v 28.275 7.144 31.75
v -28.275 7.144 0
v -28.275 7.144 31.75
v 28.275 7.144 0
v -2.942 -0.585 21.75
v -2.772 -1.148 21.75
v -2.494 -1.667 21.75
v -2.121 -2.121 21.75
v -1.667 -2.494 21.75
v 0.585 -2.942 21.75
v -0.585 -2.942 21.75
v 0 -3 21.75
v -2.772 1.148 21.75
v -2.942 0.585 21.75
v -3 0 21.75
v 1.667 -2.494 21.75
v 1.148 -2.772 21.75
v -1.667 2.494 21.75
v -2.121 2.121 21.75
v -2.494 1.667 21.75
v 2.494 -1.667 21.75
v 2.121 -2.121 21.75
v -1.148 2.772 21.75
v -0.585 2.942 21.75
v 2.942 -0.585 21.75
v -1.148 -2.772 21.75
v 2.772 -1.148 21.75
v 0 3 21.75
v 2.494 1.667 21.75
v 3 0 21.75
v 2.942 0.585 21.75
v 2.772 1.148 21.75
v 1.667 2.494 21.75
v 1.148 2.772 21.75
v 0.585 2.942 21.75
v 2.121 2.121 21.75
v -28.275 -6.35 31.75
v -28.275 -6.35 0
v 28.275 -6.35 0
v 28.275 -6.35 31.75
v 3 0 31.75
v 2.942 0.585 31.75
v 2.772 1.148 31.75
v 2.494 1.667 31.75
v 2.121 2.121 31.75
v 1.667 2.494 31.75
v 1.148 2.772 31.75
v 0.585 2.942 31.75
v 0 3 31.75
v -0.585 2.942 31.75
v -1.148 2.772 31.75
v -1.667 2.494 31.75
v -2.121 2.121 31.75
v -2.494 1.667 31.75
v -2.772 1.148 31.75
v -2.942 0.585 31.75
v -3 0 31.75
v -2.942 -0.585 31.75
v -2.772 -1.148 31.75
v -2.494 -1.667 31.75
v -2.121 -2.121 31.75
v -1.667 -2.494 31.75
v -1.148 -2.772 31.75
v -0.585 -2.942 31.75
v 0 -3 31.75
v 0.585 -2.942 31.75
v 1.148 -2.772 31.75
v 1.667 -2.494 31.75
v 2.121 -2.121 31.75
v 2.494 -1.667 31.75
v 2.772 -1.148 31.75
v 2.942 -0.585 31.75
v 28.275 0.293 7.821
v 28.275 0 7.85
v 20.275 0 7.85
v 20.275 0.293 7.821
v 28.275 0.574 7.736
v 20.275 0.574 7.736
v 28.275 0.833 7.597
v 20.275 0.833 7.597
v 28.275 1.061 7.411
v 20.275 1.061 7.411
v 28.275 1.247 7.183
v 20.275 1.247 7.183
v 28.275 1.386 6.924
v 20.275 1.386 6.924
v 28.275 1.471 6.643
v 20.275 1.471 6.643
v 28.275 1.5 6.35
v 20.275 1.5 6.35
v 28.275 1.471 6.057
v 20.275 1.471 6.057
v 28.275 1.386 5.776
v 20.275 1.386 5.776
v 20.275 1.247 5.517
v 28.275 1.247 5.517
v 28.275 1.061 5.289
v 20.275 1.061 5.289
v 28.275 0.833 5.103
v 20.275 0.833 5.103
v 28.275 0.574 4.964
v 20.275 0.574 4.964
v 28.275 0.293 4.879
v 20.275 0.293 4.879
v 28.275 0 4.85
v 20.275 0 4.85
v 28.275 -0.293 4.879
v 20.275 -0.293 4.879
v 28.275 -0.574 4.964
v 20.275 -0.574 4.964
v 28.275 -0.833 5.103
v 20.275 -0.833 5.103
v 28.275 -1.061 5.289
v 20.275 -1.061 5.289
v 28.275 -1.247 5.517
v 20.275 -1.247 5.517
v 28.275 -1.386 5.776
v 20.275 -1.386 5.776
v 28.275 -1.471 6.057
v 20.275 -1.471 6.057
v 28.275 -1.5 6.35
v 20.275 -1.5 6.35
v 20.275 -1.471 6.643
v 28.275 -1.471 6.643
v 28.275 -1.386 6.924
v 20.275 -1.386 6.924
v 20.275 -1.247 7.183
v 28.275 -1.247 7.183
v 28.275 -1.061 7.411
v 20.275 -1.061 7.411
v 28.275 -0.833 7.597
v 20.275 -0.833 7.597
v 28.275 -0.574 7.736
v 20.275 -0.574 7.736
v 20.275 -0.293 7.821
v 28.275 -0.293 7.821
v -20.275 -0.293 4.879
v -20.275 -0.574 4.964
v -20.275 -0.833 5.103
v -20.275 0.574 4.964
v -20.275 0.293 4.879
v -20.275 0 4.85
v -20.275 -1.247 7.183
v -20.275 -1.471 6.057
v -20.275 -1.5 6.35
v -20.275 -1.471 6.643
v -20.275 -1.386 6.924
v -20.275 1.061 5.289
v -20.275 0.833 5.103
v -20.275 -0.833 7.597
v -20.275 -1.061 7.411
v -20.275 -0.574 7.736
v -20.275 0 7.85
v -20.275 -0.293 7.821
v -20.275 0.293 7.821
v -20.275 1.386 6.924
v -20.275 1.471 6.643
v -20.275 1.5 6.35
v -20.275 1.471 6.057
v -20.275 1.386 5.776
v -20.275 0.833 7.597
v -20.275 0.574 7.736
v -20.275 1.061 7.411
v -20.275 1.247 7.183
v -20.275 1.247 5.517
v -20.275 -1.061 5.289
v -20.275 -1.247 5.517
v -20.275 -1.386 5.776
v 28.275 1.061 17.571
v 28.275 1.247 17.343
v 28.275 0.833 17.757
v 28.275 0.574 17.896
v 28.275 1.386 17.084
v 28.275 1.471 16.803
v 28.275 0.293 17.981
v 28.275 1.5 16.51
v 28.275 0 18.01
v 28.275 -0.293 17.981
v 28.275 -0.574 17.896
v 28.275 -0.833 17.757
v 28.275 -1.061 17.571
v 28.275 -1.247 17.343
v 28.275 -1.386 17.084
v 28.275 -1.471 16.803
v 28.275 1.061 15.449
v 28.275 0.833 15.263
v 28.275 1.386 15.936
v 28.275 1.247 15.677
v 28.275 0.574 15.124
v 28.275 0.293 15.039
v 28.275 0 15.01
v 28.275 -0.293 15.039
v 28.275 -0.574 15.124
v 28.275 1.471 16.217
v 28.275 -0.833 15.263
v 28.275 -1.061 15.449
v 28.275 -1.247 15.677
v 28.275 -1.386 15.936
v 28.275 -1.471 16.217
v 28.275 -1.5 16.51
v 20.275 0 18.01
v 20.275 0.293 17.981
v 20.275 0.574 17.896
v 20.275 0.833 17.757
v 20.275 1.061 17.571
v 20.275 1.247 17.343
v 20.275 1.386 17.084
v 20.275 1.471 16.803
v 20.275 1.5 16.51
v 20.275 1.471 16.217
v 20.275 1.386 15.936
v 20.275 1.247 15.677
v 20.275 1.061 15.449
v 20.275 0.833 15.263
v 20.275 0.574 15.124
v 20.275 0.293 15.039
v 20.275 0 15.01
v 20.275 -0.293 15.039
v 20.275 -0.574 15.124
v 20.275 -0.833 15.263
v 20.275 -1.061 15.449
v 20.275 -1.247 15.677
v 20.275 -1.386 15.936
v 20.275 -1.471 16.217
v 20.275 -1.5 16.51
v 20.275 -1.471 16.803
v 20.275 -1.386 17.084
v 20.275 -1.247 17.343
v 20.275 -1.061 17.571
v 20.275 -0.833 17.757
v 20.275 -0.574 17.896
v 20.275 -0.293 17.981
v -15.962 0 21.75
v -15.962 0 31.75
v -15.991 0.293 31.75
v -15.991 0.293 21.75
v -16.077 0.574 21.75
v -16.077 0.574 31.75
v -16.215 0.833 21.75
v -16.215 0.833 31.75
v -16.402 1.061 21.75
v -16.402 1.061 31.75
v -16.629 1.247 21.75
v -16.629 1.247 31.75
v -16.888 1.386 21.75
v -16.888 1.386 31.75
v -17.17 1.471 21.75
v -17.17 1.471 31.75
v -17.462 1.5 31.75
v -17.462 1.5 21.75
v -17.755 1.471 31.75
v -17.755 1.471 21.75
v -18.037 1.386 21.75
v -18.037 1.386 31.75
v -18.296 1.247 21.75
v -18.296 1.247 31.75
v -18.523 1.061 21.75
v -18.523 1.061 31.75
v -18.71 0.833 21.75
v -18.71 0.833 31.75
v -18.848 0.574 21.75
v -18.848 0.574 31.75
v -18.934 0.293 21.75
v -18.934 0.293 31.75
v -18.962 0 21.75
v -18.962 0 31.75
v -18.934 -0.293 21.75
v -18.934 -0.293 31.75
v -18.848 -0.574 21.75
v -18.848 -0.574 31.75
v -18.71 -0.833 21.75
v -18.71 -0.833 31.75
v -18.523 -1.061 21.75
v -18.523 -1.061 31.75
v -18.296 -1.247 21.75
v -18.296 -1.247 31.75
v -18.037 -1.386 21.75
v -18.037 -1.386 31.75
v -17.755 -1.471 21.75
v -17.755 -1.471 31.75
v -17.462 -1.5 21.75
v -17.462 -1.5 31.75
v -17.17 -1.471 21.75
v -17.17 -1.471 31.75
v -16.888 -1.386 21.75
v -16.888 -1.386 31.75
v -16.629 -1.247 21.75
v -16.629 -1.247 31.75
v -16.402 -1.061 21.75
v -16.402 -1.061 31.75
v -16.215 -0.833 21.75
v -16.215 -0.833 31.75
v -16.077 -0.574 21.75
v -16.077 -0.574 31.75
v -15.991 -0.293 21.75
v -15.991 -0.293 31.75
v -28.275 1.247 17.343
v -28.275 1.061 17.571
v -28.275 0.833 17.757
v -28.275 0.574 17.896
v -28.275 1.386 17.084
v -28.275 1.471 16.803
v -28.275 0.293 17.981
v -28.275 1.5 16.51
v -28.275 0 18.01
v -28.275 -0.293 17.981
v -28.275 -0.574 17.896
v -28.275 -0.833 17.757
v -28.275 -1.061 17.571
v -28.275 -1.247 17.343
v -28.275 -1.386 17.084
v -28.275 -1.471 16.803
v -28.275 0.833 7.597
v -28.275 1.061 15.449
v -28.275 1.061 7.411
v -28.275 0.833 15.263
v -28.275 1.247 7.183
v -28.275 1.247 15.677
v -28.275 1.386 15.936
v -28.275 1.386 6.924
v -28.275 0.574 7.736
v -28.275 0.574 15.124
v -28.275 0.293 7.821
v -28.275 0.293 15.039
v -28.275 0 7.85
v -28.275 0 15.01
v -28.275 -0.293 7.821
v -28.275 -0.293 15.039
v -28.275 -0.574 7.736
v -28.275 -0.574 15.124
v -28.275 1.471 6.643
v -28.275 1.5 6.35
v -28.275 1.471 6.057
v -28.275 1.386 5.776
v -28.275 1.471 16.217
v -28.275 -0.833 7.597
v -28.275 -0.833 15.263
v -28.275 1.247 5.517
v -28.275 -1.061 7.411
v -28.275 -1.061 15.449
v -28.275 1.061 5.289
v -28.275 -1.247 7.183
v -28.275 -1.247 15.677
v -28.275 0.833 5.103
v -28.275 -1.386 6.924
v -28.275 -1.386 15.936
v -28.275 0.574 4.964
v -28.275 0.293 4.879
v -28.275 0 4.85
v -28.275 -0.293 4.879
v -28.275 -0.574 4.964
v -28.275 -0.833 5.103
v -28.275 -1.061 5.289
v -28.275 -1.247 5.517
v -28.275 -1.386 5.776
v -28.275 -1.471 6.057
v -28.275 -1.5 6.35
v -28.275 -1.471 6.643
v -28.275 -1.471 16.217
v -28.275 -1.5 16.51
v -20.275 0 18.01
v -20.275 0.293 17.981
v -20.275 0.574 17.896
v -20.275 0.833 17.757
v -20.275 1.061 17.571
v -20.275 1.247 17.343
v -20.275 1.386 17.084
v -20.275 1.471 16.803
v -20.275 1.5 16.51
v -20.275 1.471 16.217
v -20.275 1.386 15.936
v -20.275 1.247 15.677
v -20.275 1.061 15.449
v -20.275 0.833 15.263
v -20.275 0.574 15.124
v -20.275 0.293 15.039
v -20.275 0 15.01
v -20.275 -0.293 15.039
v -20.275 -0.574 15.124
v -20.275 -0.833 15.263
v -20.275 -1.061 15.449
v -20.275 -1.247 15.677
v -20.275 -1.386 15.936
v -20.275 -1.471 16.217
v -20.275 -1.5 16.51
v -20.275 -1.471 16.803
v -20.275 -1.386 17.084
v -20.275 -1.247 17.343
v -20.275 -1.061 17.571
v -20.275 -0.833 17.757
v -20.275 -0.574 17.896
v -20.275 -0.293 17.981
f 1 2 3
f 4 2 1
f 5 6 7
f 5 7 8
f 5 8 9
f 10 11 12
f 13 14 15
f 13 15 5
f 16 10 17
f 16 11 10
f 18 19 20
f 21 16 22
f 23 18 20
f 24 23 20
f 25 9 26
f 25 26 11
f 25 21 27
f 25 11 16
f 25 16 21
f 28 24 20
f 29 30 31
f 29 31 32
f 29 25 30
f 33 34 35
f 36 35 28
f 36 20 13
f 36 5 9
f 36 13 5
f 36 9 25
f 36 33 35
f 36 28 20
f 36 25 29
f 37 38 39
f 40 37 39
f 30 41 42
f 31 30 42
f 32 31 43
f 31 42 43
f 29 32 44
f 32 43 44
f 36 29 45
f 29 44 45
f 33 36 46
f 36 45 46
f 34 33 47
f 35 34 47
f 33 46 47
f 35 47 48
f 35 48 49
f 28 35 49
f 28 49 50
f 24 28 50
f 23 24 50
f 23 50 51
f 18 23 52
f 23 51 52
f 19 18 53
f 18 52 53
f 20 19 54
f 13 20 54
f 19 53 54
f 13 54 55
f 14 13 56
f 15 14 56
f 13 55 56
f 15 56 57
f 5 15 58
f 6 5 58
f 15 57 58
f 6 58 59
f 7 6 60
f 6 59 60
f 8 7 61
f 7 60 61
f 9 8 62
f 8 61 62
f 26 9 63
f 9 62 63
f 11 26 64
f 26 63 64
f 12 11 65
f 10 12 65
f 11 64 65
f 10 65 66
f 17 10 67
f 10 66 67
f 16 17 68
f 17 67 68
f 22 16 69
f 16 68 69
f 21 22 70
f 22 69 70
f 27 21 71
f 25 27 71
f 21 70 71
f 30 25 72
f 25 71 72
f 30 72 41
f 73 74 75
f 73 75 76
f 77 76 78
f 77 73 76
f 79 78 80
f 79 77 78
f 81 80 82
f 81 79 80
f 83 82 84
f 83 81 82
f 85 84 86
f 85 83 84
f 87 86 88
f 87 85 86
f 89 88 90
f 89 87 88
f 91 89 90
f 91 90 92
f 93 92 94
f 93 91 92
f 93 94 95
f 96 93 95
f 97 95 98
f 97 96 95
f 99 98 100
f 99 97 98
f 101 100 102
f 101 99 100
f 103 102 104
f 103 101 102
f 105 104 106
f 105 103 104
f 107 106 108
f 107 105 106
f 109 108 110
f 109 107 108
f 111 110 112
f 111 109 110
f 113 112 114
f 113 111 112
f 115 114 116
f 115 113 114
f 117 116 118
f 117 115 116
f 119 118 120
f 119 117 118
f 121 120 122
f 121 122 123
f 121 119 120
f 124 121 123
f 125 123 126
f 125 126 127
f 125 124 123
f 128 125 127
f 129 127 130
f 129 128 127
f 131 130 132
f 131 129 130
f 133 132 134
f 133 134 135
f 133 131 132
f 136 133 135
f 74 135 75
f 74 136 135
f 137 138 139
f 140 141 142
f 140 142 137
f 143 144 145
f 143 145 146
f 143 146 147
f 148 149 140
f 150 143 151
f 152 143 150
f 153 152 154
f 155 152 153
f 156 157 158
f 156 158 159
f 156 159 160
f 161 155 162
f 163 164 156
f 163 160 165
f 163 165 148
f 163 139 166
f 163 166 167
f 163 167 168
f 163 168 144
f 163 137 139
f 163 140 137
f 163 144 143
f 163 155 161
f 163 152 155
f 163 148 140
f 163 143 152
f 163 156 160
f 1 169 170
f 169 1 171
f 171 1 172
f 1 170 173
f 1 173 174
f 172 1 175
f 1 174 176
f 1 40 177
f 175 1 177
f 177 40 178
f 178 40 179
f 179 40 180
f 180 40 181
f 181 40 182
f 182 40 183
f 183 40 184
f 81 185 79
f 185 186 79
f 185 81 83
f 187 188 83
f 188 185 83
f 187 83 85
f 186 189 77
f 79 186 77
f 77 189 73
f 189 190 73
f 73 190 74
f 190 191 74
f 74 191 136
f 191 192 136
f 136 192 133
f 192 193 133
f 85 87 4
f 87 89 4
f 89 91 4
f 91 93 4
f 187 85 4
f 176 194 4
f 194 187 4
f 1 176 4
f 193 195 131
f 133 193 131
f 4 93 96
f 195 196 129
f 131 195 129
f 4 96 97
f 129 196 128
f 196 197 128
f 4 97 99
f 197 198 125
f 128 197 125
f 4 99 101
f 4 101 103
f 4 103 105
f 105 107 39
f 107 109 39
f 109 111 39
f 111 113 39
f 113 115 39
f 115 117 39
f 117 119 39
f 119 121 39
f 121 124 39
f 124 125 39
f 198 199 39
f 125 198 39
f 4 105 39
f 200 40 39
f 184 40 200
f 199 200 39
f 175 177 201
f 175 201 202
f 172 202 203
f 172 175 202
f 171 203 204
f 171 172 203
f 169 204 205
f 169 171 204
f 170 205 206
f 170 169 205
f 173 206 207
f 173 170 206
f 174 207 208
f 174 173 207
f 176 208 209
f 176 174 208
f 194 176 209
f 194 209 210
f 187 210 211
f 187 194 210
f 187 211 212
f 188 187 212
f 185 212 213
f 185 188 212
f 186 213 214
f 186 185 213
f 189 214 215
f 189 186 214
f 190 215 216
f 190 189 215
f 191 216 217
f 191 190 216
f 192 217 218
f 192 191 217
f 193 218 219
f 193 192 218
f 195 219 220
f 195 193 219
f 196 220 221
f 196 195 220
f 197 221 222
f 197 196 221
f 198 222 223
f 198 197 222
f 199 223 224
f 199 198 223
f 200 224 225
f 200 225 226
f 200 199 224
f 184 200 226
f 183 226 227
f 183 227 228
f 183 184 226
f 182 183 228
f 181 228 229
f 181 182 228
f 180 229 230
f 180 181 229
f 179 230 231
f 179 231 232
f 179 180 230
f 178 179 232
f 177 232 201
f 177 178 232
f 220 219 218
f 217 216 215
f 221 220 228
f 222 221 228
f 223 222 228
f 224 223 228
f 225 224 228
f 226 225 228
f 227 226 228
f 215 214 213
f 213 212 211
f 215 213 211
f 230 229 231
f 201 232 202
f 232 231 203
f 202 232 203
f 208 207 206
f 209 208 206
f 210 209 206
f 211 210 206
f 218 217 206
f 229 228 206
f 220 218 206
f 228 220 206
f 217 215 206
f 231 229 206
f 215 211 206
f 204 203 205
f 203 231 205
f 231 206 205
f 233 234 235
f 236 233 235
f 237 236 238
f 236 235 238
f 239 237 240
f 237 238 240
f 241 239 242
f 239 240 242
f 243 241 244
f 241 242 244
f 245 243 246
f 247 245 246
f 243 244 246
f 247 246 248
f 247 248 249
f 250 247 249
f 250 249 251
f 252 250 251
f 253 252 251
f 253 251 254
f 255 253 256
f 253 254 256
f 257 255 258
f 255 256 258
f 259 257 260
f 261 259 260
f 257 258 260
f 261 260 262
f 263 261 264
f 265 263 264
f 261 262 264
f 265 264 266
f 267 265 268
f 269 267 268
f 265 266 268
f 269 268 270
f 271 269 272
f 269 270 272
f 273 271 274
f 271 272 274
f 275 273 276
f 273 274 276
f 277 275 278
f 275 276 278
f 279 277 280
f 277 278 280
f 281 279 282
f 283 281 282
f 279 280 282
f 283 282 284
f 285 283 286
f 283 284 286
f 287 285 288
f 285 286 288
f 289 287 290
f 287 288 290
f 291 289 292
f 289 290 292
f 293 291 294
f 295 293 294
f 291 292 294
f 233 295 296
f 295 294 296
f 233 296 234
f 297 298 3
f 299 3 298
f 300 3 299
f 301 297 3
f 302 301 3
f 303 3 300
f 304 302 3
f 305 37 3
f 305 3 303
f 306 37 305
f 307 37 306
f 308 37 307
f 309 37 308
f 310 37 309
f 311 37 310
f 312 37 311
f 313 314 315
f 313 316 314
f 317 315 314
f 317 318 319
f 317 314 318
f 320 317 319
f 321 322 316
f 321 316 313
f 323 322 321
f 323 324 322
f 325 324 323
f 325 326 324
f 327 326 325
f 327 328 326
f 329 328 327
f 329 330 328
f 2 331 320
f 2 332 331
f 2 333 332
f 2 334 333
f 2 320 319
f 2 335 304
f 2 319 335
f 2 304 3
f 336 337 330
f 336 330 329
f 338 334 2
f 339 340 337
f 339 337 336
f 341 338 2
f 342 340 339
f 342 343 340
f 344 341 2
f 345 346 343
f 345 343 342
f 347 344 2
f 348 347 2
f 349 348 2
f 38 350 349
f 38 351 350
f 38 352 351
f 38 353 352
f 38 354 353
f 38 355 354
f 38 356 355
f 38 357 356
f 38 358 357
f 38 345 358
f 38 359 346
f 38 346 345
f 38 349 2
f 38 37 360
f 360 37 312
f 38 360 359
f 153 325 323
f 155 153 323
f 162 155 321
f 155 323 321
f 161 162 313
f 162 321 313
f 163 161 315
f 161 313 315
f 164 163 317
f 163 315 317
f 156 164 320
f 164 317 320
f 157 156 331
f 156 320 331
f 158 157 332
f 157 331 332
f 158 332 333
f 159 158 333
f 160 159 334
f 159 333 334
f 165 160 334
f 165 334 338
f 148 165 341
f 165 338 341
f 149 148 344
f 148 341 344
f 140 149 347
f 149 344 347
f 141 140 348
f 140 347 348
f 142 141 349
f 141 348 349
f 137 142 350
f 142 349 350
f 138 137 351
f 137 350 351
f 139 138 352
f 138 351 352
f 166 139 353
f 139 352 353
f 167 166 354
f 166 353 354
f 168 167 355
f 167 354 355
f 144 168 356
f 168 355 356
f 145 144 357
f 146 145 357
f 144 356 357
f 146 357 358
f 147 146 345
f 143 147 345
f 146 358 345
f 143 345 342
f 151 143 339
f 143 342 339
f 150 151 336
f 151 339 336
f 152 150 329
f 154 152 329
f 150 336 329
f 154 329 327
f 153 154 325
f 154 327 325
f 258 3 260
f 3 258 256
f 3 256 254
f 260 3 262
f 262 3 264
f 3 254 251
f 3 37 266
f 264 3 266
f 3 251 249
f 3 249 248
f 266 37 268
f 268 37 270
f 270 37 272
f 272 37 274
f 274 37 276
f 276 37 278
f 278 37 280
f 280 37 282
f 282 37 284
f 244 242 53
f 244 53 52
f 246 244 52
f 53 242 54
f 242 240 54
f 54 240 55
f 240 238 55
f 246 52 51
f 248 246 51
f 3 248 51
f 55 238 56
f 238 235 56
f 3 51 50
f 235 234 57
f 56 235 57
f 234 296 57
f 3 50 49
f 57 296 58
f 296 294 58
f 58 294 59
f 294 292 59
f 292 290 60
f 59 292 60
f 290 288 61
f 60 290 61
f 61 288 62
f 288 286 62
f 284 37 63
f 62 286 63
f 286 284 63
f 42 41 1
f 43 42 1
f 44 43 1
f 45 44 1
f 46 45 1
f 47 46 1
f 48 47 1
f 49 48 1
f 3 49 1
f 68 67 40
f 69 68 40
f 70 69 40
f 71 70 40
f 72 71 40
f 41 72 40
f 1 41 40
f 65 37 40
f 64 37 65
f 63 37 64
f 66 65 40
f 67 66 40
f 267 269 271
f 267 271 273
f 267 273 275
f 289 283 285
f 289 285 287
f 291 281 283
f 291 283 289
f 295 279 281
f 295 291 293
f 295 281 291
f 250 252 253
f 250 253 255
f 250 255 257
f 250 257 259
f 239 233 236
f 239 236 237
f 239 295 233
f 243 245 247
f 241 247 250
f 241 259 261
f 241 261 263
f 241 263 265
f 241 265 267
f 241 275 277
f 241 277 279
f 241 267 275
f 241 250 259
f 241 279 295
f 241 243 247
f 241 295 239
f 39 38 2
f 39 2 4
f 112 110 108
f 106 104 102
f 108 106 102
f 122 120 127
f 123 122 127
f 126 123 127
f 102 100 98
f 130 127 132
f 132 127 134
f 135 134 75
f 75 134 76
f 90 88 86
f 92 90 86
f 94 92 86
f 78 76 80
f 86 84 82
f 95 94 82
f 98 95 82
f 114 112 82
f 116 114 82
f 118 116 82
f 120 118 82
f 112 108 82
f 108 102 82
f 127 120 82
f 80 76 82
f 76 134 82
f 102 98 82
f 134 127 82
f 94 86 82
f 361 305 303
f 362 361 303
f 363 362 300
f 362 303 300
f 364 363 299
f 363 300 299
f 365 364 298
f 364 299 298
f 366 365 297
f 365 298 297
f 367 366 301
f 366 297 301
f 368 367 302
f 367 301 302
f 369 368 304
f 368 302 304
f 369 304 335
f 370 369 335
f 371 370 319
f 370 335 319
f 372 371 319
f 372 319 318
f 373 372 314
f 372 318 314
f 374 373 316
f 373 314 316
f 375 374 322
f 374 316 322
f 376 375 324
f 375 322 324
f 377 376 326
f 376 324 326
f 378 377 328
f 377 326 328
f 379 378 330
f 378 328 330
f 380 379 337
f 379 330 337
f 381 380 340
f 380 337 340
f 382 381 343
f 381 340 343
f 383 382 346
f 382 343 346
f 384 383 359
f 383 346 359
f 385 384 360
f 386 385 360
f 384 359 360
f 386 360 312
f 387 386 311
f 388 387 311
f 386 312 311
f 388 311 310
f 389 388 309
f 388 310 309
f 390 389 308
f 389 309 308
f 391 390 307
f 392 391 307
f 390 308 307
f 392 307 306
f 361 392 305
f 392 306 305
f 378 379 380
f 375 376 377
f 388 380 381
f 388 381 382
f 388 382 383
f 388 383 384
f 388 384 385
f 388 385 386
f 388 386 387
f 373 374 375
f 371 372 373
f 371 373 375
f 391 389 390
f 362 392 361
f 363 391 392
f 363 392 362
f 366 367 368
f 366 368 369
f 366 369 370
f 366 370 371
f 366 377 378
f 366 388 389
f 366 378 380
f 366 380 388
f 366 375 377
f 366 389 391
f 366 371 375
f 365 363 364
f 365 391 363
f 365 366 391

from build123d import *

# Parameters (mm, degrees)
SKETCH1_W           = 56.55
SKETCH1_H           = 12.7
BOSS_EXTRUDE1_DEPTH = 31.75
SKETCH2_R           = 1.5
SKETCH2_R_2         = 3
CUT_EXTRUDE1_DEPTH  = 10
CUT_EXTRUDE2_DEPTH  = 8
SKETCH4_W           = 56.55
SKETCH4_H           = 31.75
BOSS_EXTRUDE2_DEPTH = 0.79375


with BuildPart() as part:
    # Sketch1 → Boss-Extrude1 (new body)
    with BuildSketch(Plane.XY):
        Rectangle(SKETCH1_W, SKETCH1_H)
    extrude(amount=BOSS_EXTRUDE1_DEPTH)

    # Sketch2 → Cut-Extrude1 (cut)
    with BuildSketch(Plane.XY.offset(31.75)):
        with Locations((-17.4625, 0)):
            Circle(SKETCH2_R)
        Circle(SKETCH2_R_2)
    extrude(amount=-CUT_EXTRUDE1_DEPTH, mode=Mode.SUBTRACT)

    # Sketch3 → Cut-Extrude2 (cut)
    with BuildSketch(Plane.ZY.offset(28.275)):
        with BuildLine():
            ThreePointArc((4.85, 0), (6.35, -1.5), (7.85, 0))
            Line((7.85, 0), (4.85, 0))
        make_face()
        with BuildLine():
            Line((4.85, 0), (7.85, 0))
            ThreePointArc((7.85, 0), (6.35, 1.5), (4.85, 0))
        make_face()
        with BuildLine():
            ThreePointArc((15.01, 0), (16.51, -1.5), (18.01, 0))
            Line((18.01, 0), (15.01, 0))
        make_face()
        with BuildLine():
            Line((15.01, 0), (18.01, 0))
            ThreePointArc((18.01, 0), (16.51, 1.5), (15.01, 0))
        make_face()
    cut_extrude2 = extrude(amount=-CUT_EXTRUDE2_DEPTH, mode=Mode.SUBTRACT)

    # Sketch4 → Boss-Extrude2 (add)
    with BuildSketch(Plane(origin=(0, 6.35, 0), x_dir=(1, 0, 0), z_dir=(0, 1, 0))):
        with Locations((0, -15.875)):
            Rectangle(SKETCH4_W, SKETCH4_H)
    extrude(amount=BOSS_EXTRUDE2_DEPTH)

    # Mirror1: Cut-Extrude2 across plane
    add(cut_extrude2.mirror(Plane(origin=(0, 0, 0), x_dir=(0, 0, 1), z_dir=(1, 0, 0))), mode=Mode.SUBTRACT)


solid = part.part
